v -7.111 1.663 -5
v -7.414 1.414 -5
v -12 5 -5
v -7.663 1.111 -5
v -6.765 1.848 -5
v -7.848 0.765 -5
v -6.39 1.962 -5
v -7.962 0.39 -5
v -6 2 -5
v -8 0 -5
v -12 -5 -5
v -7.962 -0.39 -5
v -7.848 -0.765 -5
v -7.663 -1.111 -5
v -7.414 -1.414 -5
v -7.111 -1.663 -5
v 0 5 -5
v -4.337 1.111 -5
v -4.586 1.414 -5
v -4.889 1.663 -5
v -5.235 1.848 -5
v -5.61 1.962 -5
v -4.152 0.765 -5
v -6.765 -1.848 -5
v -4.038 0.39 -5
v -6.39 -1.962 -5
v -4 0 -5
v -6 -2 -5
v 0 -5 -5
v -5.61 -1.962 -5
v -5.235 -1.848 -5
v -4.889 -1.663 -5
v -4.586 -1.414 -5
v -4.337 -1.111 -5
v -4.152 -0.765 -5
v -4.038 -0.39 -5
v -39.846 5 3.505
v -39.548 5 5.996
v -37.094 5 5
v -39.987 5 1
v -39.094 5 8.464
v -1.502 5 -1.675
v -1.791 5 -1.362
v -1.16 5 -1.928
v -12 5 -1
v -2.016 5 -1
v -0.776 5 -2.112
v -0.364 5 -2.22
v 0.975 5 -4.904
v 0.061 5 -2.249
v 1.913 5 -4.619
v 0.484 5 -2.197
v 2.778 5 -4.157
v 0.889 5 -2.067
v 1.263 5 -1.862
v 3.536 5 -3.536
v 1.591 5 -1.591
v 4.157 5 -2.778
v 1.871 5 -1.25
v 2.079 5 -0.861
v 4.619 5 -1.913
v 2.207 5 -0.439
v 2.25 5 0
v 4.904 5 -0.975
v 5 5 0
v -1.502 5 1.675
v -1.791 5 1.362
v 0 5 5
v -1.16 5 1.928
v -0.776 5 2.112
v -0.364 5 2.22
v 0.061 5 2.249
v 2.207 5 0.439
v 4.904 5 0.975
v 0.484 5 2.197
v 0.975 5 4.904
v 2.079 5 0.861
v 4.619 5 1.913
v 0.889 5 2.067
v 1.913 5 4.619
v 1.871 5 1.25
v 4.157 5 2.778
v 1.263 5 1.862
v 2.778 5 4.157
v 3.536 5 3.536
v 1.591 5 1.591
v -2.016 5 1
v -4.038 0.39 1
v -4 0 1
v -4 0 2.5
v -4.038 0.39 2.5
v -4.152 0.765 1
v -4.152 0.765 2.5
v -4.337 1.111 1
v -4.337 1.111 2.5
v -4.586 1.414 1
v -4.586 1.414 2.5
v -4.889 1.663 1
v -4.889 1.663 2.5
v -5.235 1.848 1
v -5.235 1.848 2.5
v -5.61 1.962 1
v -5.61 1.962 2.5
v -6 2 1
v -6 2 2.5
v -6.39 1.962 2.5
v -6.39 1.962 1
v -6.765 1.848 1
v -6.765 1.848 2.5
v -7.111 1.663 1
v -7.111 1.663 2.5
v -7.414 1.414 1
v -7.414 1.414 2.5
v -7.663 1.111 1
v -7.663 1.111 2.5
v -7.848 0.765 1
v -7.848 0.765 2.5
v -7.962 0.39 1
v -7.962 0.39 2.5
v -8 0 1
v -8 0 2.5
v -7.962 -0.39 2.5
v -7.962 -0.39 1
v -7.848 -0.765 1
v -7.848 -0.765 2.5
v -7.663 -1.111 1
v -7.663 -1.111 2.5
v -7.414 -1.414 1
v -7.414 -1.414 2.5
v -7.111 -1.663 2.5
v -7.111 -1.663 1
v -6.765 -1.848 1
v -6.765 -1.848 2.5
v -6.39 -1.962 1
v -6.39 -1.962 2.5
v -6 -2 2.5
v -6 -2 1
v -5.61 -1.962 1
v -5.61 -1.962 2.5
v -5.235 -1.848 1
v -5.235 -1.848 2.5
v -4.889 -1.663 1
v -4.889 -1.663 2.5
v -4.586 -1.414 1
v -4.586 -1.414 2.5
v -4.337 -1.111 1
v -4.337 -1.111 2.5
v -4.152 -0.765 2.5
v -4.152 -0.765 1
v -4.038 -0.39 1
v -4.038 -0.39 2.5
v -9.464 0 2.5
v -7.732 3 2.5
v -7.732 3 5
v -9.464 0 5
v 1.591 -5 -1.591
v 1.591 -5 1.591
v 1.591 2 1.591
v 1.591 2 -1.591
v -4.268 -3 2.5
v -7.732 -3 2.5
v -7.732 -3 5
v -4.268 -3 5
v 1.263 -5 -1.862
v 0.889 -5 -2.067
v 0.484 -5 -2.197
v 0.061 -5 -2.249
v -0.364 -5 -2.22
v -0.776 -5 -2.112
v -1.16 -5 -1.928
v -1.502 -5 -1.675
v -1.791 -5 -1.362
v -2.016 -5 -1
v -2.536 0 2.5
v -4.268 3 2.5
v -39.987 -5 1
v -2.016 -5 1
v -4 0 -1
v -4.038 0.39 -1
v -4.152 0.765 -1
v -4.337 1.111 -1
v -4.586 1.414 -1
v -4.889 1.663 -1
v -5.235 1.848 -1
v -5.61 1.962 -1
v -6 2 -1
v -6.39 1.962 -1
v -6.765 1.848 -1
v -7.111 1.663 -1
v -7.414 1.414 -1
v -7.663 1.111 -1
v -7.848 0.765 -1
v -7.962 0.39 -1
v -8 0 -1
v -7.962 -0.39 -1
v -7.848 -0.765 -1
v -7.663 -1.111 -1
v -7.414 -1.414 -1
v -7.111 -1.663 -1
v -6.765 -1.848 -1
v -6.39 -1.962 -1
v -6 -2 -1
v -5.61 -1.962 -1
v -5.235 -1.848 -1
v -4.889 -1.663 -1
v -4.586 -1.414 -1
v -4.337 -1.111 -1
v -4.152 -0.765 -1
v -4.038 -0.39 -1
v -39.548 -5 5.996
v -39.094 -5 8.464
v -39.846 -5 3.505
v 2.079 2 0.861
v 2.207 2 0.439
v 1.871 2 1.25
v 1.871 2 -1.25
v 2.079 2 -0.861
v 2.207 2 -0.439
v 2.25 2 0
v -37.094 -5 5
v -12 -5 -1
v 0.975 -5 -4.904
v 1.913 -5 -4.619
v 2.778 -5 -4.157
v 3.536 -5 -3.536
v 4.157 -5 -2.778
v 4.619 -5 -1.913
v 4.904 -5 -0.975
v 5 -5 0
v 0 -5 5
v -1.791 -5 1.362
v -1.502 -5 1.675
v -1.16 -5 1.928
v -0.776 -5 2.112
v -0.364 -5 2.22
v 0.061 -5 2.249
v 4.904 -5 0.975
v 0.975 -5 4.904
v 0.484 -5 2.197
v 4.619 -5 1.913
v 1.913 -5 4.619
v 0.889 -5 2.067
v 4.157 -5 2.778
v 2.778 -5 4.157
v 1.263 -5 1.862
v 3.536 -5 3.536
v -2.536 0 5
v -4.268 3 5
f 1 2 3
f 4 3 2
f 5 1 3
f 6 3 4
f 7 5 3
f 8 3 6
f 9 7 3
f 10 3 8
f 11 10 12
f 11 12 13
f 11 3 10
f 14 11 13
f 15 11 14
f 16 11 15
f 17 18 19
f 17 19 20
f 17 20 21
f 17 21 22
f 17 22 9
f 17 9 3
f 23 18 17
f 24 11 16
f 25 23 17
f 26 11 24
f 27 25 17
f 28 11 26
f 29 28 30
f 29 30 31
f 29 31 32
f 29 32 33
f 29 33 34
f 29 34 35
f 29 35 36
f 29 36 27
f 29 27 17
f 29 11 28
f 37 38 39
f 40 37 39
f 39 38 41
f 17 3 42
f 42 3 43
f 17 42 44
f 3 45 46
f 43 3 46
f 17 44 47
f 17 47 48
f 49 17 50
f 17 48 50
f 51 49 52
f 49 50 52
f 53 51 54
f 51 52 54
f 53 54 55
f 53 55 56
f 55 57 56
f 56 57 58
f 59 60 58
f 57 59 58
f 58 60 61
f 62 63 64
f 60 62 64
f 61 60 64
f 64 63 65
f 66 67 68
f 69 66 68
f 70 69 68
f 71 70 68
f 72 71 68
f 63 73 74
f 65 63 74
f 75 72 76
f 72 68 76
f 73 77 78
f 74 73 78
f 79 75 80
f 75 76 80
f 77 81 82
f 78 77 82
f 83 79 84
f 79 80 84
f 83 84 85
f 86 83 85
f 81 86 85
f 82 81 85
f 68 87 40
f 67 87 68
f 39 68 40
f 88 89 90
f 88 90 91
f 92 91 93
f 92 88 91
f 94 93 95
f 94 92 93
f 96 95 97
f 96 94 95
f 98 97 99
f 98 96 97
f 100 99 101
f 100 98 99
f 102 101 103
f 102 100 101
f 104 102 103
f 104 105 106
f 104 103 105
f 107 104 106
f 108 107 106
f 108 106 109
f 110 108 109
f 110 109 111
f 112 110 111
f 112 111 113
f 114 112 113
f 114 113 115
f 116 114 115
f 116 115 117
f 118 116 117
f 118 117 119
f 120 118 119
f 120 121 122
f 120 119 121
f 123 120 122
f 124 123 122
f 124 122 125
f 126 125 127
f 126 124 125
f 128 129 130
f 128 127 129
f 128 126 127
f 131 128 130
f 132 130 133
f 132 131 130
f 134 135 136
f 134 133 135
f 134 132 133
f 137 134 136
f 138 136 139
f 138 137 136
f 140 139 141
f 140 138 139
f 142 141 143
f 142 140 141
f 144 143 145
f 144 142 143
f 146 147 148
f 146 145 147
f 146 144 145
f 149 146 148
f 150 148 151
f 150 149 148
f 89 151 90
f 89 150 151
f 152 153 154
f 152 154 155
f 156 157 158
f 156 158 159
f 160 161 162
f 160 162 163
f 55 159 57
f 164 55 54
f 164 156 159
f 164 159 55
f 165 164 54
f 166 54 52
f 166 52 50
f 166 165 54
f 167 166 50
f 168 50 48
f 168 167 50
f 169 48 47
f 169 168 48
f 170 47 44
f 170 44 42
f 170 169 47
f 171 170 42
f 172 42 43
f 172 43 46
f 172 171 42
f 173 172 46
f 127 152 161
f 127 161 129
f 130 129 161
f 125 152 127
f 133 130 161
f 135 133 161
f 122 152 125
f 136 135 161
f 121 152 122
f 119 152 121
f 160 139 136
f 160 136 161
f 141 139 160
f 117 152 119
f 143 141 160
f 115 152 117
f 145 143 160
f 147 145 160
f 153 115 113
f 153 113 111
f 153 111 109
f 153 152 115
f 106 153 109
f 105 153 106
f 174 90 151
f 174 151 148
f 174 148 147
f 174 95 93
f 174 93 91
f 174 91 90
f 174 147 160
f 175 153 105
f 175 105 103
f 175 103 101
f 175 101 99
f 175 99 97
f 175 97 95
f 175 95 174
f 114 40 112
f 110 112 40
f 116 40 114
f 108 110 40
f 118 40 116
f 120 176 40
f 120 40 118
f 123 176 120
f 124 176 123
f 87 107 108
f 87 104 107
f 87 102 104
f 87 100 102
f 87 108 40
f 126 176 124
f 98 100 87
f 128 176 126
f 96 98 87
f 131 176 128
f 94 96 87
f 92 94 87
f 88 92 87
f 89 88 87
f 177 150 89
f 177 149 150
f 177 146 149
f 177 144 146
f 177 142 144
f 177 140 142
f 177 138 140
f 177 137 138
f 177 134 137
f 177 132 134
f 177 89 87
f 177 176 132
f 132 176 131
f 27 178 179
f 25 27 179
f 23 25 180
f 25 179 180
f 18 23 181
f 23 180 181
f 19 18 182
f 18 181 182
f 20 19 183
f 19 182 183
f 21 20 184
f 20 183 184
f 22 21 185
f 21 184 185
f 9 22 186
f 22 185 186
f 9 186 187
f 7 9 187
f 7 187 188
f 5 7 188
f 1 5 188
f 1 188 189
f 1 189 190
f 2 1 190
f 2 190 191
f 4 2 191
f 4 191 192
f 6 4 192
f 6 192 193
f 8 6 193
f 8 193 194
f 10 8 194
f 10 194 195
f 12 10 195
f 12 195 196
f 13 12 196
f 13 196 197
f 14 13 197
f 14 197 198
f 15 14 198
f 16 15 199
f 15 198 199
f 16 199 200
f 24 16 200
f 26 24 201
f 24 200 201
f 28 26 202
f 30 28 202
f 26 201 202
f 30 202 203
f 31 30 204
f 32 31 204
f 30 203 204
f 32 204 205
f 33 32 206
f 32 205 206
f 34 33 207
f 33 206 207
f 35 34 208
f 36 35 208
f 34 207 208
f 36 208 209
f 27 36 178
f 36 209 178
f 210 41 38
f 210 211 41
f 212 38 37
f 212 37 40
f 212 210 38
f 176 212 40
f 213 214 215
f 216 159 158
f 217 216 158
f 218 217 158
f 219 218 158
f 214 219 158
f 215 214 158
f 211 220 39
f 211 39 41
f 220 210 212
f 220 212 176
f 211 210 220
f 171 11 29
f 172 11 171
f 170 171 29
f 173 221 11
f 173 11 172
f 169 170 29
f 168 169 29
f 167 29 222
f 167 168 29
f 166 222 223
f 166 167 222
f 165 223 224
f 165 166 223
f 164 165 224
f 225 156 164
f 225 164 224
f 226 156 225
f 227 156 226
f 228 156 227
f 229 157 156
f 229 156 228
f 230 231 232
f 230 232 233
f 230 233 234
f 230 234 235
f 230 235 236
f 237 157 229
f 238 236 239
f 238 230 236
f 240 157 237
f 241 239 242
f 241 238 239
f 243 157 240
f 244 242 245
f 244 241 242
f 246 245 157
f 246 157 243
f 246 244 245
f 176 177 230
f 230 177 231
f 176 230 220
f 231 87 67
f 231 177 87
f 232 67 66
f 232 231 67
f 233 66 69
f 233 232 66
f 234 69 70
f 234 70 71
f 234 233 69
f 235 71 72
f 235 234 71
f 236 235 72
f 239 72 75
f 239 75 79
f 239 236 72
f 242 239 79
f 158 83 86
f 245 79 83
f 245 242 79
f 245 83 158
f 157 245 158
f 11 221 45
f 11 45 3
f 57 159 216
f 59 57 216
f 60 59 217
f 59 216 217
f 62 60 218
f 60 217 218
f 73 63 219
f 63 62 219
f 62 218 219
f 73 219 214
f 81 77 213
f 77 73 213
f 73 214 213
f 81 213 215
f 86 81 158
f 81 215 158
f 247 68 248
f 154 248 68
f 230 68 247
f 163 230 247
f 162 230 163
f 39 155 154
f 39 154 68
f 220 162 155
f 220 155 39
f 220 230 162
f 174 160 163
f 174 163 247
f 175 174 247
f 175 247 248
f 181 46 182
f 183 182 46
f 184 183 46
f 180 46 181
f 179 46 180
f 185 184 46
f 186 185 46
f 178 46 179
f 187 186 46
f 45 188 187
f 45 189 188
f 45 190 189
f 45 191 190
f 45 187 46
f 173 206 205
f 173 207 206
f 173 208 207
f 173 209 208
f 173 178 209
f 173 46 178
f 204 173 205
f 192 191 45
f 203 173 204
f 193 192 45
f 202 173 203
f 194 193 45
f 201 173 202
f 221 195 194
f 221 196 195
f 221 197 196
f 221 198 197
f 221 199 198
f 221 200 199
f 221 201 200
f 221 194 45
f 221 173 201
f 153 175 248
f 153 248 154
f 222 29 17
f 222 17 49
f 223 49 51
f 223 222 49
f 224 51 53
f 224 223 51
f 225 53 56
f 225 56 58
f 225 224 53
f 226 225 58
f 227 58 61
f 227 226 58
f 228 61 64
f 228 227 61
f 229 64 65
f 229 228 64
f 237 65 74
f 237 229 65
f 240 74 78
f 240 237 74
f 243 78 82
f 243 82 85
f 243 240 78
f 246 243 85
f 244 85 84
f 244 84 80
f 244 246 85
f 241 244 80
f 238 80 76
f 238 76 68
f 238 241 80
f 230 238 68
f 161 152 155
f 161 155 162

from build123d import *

# Parameters (mm, degrees)
F4_DEPTH      = 5
F4_DEPTH_BACK = 5
F1_R          = 2
F5_DEPTH      = 12
F5_DEPTH_BACK = 25
F6_START      = 2.5
F6_DEPTH      = 3.5
F7_START      = -2
F3_R          = 2.25
F7_DEPTH      = 23


with BuildPart() as f4:
    # F0 (on Front) → F4 (new body, two sides)
    with BuildSketch(Plane.XZ) as f4_sk:
        with BuildLine():
            ThreePointArc((-2.0155644371, 1), (-0.3638449939, 2.2203866376), (1.5909902577, 1.5909902577))
            Line((1.5909902577, 1.5909902577), (1.5909902577, -1.5909902577))
            ThreePointArc((1.5909902577, -1.5909902577), (-0.3638449939, -2.2203866376), (-2.0155644371, -1))
            Line((-2.0155644371, -1), (-12, -1))
            Line((-12, -1), (-12, -5))
            Line((-12, -5), (0, -5))
            ThreePointArc((0, -5), (5, 0), (0, 5))
            Line((0, 5), (-37.0942321046, 5))
            Line((-37.0942321046, 5), (-39.0942321046, 8.4641016151))
            ThreePointArc((-39.0942321046, 8.4641016151), (-39.7165987233, 4.753081722), (-39.9874980463, 1))
            Line((-39.9874980463, 1), (-2.0155644371, 1))
        make_face()
    extrude(amount=F4_DEPTH)
    extrude(f4_sk.sketch, amount=-F4_DEPTH_BACK)

    # F1 (on Top) → F5 (cut, two sides)
    with BuildSketch(Plane.XY) as f5_sk:
        with Locations((-6, 0)):
            Circle(F1_R)
    extrude(amount=-F5_DEPTH, mode=Mode.SUBTRACT)
    extrude(f5_sk.sketch, amount=F5_DEPTH_BACK, mode=Mode.SUBTRACT)

    # F2 (on Top) → F6 (cut)
    with BuildSketch(Plane.XY.offset(F6_START)):
        Polygon((-4.2679491924, -3), (-2.5358983849, 0), (-4.2679491924, 3), (-7.7320508076, 3), (-9.4641016151, 0), (-7.7320508076, -3), align=None)
    extrude(amount=F6_DEPTH, mode=Mode.SUBTRACT)

    # F3 (on Front) → F7 (cut)
    with BuildSketch(Plane.XZ.offset(F7_START)):
        Circle(F3_R)
    extrude(amount=-F7_DEPTH, mode=Mode.SUBTRACT)


solid = f4.part
